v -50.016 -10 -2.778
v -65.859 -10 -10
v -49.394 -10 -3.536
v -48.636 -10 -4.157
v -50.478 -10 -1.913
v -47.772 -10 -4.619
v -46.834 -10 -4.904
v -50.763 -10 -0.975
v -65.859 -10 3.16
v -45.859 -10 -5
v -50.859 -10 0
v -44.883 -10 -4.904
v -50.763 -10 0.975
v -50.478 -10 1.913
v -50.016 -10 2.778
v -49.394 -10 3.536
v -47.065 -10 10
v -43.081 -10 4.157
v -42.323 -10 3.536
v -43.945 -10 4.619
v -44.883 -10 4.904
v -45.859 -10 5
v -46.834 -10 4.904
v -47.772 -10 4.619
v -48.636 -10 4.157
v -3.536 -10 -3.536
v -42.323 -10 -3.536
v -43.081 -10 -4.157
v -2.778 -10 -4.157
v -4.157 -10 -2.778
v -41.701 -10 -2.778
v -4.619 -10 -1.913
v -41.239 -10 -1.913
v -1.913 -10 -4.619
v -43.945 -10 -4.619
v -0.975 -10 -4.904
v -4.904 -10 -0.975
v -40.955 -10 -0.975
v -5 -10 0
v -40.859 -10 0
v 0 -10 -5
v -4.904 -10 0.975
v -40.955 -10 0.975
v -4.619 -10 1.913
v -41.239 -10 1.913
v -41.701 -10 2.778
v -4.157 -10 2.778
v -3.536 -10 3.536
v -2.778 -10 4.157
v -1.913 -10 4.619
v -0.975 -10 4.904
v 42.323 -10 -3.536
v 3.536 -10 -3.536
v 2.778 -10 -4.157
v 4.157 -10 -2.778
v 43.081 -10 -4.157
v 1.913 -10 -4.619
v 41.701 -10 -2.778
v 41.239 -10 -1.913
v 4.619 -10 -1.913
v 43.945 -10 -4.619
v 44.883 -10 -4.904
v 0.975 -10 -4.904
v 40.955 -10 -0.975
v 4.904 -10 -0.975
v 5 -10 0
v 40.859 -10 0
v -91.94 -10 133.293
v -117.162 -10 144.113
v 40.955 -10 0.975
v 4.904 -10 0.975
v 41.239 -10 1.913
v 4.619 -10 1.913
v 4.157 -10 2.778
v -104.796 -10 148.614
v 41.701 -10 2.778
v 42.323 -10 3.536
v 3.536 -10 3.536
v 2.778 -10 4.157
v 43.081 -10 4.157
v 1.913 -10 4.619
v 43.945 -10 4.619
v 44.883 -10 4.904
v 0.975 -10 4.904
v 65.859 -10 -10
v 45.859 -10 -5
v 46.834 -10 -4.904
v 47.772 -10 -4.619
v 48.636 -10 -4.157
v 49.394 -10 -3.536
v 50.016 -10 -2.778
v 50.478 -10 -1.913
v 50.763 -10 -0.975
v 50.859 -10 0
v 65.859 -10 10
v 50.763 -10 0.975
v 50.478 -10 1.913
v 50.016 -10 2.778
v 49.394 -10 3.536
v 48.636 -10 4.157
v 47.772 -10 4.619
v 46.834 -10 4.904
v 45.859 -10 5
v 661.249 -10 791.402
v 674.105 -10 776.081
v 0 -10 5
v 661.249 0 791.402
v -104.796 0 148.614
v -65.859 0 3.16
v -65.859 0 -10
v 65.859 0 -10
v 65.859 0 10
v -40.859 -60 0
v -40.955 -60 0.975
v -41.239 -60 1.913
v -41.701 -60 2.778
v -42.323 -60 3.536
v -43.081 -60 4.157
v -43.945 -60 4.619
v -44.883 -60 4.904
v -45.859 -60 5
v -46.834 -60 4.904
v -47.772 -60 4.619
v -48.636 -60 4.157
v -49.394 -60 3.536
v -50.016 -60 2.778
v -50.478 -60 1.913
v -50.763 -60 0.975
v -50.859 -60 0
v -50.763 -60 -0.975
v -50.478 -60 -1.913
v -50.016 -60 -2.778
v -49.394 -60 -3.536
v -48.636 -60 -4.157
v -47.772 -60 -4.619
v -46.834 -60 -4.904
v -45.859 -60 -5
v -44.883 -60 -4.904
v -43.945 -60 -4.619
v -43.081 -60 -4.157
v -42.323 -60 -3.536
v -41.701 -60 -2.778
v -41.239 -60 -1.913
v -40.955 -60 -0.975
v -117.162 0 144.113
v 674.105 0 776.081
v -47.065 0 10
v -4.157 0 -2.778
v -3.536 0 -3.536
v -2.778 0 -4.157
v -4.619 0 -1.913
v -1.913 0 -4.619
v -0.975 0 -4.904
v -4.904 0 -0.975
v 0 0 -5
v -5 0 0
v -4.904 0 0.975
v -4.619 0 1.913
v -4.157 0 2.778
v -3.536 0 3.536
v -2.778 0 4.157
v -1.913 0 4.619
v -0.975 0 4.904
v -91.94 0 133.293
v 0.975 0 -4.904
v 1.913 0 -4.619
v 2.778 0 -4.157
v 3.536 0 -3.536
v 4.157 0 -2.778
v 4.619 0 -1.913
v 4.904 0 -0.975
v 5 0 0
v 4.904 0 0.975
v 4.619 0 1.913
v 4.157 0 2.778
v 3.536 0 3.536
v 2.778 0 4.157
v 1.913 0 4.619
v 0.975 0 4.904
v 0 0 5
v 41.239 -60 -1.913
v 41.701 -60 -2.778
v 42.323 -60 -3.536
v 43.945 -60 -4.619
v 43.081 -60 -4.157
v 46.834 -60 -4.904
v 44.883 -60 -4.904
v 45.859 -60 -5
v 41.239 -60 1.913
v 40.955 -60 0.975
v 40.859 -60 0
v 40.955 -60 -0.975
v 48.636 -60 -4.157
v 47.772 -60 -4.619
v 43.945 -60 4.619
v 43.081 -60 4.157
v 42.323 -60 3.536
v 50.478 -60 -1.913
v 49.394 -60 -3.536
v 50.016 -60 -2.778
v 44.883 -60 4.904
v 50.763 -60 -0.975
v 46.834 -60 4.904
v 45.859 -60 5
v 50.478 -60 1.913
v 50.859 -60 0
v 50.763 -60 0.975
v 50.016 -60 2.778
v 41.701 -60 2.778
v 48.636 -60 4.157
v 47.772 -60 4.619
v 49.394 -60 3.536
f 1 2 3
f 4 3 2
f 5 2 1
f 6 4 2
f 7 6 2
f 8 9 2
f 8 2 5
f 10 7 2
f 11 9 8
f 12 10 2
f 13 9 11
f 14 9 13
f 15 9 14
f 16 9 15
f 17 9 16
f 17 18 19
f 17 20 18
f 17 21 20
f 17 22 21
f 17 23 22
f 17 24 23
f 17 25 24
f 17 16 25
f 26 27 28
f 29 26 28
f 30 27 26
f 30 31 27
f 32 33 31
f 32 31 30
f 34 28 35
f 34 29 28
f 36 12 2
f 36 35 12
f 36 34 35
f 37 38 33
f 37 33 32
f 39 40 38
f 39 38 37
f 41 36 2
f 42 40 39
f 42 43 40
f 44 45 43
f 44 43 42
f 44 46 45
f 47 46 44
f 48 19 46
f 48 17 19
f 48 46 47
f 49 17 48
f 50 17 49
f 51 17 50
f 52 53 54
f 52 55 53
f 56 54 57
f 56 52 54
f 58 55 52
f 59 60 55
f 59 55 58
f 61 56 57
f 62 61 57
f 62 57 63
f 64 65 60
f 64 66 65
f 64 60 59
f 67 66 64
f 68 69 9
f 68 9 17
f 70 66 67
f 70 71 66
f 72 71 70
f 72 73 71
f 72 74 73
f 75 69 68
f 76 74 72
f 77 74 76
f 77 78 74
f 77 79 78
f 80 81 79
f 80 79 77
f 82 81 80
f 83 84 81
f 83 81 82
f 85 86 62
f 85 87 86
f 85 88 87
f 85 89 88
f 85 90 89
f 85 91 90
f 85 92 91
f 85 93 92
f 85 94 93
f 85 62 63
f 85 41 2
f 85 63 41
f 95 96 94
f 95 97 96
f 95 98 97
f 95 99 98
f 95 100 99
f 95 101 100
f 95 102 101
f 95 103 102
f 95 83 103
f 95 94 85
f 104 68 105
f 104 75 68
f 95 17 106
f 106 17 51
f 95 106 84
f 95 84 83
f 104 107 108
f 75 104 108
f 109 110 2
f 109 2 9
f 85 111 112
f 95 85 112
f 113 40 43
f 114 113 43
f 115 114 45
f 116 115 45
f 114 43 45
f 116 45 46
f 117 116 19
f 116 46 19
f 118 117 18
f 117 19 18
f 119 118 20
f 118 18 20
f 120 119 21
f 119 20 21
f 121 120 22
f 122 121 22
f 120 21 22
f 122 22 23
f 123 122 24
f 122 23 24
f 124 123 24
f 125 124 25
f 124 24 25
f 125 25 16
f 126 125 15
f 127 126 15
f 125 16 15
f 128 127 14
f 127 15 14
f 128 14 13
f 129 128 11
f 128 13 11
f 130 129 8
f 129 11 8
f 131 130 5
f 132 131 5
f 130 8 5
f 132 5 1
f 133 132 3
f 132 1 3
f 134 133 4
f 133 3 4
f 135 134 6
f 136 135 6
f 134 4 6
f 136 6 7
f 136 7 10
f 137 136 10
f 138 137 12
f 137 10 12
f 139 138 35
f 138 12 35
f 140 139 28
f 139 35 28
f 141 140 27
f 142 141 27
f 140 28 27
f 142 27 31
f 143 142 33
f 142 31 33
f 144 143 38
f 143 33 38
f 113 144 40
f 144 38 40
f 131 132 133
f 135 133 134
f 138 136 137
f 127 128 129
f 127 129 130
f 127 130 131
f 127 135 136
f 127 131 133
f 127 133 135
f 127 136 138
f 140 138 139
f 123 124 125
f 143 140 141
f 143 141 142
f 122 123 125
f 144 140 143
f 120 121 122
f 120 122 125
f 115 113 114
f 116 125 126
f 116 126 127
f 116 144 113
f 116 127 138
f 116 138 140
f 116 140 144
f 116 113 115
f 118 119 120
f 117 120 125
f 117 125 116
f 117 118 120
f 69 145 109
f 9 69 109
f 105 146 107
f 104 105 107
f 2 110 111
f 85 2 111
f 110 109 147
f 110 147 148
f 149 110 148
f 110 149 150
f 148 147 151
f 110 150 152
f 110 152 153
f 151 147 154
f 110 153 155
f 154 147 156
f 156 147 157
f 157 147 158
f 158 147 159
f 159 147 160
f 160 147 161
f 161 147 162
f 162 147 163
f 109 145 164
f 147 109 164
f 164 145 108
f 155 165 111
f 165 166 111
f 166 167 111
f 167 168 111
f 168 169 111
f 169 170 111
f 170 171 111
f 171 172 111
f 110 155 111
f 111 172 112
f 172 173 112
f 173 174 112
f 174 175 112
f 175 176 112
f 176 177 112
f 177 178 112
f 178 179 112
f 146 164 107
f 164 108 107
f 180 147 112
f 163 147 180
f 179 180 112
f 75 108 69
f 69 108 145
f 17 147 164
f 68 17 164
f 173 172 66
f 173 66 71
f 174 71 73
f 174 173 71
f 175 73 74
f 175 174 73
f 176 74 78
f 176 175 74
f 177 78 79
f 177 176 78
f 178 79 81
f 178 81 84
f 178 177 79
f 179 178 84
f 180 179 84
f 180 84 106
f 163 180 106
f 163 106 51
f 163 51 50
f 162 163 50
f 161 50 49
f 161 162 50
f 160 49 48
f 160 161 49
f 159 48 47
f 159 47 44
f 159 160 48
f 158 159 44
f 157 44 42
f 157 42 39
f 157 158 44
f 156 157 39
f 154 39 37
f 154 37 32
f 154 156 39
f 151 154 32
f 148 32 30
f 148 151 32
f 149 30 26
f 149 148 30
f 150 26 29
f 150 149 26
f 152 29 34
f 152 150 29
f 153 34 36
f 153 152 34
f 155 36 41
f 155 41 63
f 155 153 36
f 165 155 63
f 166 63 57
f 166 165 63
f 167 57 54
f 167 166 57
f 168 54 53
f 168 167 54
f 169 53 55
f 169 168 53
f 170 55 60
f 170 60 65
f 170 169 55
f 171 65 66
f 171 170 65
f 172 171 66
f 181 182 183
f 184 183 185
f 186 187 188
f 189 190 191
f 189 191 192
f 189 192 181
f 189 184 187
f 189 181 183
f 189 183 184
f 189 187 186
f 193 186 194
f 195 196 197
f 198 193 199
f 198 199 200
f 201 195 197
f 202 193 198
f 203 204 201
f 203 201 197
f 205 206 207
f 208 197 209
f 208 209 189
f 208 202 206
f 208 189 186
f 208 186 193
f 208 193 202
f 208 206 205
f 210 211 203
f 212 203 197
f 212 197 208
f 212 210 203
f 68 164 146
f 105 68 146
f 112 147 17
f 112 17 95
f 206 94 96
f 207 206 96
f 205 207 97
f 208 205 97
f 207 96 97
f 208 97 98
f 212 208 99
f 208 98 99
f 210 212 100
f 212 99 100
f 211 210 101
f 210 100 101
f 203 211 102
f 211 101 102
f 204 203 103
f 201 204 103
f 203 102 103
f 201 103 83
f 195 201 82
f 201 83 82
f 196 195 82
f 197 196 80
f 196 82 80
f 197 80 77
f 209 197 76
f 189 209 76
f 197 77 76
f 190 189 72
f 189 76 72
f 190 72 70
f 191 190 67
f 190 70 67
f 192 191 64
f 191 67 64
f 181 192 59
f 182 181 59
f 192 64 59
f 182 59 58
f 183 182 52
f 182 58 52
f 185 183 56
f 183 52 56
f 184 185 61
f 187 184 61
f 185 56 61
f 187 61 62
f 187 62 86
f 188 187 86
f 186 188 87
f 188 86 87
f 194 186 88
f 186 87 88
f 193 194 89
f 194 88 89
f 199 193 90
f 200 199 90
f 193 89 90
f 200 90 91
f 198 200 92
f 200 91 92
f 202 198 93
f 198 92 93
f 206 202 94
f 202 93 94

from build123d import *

# Parameters (mm, degrees)
F0_W     = 131.7172
F0_H     = 20
F0_R     = 5
F1_DEPTH = 10
F2_R     = 5
F3_DEPTH = 50
F5_DEPTH = 10
F7_DEPTH = 10


with BuildPart() as f1:
    # F0 (on Front) → F1 (new body)
    with BuildSketch(Plane.XZ):
        Rectangle(F0_W, F0_H)
        Circle(F0_R, mode=Mode.SUBTRACT)
    extrude(amount=F1_DEPTH)

    # F2 (on face) → F3 (join)
    with BuildSketch(Plane.XZ.offset(10)):
        with Locations((-45.8586, 0)):
            Circle(F2_R)
        with Locations((45.8586, 0)):
            Circle(F2_R)
    extrude(amount=F3_DEPTH)

    # F4 (on Front) → F5 (join)
    with BuildSketch(Plane.XZ):
        Polygon((-117.161621, 144.11349), (-65.8586, 3.159597), (-47.064747, 10), (-98.367769, 150.953893), align=None)
    extrude(amount=F5_DEPTH)

    # F6 (on Front) → F7 (join)
    with BuildSketch(Plane.XZ):
        Polygon((661.248798, 791.401947), (-104.795645, 148.614338), (-91.939893, 133.293449), (674.104551, 776.081058), align=None)
    extrude(amount=F7_DEPTH)


solid = f1.part
